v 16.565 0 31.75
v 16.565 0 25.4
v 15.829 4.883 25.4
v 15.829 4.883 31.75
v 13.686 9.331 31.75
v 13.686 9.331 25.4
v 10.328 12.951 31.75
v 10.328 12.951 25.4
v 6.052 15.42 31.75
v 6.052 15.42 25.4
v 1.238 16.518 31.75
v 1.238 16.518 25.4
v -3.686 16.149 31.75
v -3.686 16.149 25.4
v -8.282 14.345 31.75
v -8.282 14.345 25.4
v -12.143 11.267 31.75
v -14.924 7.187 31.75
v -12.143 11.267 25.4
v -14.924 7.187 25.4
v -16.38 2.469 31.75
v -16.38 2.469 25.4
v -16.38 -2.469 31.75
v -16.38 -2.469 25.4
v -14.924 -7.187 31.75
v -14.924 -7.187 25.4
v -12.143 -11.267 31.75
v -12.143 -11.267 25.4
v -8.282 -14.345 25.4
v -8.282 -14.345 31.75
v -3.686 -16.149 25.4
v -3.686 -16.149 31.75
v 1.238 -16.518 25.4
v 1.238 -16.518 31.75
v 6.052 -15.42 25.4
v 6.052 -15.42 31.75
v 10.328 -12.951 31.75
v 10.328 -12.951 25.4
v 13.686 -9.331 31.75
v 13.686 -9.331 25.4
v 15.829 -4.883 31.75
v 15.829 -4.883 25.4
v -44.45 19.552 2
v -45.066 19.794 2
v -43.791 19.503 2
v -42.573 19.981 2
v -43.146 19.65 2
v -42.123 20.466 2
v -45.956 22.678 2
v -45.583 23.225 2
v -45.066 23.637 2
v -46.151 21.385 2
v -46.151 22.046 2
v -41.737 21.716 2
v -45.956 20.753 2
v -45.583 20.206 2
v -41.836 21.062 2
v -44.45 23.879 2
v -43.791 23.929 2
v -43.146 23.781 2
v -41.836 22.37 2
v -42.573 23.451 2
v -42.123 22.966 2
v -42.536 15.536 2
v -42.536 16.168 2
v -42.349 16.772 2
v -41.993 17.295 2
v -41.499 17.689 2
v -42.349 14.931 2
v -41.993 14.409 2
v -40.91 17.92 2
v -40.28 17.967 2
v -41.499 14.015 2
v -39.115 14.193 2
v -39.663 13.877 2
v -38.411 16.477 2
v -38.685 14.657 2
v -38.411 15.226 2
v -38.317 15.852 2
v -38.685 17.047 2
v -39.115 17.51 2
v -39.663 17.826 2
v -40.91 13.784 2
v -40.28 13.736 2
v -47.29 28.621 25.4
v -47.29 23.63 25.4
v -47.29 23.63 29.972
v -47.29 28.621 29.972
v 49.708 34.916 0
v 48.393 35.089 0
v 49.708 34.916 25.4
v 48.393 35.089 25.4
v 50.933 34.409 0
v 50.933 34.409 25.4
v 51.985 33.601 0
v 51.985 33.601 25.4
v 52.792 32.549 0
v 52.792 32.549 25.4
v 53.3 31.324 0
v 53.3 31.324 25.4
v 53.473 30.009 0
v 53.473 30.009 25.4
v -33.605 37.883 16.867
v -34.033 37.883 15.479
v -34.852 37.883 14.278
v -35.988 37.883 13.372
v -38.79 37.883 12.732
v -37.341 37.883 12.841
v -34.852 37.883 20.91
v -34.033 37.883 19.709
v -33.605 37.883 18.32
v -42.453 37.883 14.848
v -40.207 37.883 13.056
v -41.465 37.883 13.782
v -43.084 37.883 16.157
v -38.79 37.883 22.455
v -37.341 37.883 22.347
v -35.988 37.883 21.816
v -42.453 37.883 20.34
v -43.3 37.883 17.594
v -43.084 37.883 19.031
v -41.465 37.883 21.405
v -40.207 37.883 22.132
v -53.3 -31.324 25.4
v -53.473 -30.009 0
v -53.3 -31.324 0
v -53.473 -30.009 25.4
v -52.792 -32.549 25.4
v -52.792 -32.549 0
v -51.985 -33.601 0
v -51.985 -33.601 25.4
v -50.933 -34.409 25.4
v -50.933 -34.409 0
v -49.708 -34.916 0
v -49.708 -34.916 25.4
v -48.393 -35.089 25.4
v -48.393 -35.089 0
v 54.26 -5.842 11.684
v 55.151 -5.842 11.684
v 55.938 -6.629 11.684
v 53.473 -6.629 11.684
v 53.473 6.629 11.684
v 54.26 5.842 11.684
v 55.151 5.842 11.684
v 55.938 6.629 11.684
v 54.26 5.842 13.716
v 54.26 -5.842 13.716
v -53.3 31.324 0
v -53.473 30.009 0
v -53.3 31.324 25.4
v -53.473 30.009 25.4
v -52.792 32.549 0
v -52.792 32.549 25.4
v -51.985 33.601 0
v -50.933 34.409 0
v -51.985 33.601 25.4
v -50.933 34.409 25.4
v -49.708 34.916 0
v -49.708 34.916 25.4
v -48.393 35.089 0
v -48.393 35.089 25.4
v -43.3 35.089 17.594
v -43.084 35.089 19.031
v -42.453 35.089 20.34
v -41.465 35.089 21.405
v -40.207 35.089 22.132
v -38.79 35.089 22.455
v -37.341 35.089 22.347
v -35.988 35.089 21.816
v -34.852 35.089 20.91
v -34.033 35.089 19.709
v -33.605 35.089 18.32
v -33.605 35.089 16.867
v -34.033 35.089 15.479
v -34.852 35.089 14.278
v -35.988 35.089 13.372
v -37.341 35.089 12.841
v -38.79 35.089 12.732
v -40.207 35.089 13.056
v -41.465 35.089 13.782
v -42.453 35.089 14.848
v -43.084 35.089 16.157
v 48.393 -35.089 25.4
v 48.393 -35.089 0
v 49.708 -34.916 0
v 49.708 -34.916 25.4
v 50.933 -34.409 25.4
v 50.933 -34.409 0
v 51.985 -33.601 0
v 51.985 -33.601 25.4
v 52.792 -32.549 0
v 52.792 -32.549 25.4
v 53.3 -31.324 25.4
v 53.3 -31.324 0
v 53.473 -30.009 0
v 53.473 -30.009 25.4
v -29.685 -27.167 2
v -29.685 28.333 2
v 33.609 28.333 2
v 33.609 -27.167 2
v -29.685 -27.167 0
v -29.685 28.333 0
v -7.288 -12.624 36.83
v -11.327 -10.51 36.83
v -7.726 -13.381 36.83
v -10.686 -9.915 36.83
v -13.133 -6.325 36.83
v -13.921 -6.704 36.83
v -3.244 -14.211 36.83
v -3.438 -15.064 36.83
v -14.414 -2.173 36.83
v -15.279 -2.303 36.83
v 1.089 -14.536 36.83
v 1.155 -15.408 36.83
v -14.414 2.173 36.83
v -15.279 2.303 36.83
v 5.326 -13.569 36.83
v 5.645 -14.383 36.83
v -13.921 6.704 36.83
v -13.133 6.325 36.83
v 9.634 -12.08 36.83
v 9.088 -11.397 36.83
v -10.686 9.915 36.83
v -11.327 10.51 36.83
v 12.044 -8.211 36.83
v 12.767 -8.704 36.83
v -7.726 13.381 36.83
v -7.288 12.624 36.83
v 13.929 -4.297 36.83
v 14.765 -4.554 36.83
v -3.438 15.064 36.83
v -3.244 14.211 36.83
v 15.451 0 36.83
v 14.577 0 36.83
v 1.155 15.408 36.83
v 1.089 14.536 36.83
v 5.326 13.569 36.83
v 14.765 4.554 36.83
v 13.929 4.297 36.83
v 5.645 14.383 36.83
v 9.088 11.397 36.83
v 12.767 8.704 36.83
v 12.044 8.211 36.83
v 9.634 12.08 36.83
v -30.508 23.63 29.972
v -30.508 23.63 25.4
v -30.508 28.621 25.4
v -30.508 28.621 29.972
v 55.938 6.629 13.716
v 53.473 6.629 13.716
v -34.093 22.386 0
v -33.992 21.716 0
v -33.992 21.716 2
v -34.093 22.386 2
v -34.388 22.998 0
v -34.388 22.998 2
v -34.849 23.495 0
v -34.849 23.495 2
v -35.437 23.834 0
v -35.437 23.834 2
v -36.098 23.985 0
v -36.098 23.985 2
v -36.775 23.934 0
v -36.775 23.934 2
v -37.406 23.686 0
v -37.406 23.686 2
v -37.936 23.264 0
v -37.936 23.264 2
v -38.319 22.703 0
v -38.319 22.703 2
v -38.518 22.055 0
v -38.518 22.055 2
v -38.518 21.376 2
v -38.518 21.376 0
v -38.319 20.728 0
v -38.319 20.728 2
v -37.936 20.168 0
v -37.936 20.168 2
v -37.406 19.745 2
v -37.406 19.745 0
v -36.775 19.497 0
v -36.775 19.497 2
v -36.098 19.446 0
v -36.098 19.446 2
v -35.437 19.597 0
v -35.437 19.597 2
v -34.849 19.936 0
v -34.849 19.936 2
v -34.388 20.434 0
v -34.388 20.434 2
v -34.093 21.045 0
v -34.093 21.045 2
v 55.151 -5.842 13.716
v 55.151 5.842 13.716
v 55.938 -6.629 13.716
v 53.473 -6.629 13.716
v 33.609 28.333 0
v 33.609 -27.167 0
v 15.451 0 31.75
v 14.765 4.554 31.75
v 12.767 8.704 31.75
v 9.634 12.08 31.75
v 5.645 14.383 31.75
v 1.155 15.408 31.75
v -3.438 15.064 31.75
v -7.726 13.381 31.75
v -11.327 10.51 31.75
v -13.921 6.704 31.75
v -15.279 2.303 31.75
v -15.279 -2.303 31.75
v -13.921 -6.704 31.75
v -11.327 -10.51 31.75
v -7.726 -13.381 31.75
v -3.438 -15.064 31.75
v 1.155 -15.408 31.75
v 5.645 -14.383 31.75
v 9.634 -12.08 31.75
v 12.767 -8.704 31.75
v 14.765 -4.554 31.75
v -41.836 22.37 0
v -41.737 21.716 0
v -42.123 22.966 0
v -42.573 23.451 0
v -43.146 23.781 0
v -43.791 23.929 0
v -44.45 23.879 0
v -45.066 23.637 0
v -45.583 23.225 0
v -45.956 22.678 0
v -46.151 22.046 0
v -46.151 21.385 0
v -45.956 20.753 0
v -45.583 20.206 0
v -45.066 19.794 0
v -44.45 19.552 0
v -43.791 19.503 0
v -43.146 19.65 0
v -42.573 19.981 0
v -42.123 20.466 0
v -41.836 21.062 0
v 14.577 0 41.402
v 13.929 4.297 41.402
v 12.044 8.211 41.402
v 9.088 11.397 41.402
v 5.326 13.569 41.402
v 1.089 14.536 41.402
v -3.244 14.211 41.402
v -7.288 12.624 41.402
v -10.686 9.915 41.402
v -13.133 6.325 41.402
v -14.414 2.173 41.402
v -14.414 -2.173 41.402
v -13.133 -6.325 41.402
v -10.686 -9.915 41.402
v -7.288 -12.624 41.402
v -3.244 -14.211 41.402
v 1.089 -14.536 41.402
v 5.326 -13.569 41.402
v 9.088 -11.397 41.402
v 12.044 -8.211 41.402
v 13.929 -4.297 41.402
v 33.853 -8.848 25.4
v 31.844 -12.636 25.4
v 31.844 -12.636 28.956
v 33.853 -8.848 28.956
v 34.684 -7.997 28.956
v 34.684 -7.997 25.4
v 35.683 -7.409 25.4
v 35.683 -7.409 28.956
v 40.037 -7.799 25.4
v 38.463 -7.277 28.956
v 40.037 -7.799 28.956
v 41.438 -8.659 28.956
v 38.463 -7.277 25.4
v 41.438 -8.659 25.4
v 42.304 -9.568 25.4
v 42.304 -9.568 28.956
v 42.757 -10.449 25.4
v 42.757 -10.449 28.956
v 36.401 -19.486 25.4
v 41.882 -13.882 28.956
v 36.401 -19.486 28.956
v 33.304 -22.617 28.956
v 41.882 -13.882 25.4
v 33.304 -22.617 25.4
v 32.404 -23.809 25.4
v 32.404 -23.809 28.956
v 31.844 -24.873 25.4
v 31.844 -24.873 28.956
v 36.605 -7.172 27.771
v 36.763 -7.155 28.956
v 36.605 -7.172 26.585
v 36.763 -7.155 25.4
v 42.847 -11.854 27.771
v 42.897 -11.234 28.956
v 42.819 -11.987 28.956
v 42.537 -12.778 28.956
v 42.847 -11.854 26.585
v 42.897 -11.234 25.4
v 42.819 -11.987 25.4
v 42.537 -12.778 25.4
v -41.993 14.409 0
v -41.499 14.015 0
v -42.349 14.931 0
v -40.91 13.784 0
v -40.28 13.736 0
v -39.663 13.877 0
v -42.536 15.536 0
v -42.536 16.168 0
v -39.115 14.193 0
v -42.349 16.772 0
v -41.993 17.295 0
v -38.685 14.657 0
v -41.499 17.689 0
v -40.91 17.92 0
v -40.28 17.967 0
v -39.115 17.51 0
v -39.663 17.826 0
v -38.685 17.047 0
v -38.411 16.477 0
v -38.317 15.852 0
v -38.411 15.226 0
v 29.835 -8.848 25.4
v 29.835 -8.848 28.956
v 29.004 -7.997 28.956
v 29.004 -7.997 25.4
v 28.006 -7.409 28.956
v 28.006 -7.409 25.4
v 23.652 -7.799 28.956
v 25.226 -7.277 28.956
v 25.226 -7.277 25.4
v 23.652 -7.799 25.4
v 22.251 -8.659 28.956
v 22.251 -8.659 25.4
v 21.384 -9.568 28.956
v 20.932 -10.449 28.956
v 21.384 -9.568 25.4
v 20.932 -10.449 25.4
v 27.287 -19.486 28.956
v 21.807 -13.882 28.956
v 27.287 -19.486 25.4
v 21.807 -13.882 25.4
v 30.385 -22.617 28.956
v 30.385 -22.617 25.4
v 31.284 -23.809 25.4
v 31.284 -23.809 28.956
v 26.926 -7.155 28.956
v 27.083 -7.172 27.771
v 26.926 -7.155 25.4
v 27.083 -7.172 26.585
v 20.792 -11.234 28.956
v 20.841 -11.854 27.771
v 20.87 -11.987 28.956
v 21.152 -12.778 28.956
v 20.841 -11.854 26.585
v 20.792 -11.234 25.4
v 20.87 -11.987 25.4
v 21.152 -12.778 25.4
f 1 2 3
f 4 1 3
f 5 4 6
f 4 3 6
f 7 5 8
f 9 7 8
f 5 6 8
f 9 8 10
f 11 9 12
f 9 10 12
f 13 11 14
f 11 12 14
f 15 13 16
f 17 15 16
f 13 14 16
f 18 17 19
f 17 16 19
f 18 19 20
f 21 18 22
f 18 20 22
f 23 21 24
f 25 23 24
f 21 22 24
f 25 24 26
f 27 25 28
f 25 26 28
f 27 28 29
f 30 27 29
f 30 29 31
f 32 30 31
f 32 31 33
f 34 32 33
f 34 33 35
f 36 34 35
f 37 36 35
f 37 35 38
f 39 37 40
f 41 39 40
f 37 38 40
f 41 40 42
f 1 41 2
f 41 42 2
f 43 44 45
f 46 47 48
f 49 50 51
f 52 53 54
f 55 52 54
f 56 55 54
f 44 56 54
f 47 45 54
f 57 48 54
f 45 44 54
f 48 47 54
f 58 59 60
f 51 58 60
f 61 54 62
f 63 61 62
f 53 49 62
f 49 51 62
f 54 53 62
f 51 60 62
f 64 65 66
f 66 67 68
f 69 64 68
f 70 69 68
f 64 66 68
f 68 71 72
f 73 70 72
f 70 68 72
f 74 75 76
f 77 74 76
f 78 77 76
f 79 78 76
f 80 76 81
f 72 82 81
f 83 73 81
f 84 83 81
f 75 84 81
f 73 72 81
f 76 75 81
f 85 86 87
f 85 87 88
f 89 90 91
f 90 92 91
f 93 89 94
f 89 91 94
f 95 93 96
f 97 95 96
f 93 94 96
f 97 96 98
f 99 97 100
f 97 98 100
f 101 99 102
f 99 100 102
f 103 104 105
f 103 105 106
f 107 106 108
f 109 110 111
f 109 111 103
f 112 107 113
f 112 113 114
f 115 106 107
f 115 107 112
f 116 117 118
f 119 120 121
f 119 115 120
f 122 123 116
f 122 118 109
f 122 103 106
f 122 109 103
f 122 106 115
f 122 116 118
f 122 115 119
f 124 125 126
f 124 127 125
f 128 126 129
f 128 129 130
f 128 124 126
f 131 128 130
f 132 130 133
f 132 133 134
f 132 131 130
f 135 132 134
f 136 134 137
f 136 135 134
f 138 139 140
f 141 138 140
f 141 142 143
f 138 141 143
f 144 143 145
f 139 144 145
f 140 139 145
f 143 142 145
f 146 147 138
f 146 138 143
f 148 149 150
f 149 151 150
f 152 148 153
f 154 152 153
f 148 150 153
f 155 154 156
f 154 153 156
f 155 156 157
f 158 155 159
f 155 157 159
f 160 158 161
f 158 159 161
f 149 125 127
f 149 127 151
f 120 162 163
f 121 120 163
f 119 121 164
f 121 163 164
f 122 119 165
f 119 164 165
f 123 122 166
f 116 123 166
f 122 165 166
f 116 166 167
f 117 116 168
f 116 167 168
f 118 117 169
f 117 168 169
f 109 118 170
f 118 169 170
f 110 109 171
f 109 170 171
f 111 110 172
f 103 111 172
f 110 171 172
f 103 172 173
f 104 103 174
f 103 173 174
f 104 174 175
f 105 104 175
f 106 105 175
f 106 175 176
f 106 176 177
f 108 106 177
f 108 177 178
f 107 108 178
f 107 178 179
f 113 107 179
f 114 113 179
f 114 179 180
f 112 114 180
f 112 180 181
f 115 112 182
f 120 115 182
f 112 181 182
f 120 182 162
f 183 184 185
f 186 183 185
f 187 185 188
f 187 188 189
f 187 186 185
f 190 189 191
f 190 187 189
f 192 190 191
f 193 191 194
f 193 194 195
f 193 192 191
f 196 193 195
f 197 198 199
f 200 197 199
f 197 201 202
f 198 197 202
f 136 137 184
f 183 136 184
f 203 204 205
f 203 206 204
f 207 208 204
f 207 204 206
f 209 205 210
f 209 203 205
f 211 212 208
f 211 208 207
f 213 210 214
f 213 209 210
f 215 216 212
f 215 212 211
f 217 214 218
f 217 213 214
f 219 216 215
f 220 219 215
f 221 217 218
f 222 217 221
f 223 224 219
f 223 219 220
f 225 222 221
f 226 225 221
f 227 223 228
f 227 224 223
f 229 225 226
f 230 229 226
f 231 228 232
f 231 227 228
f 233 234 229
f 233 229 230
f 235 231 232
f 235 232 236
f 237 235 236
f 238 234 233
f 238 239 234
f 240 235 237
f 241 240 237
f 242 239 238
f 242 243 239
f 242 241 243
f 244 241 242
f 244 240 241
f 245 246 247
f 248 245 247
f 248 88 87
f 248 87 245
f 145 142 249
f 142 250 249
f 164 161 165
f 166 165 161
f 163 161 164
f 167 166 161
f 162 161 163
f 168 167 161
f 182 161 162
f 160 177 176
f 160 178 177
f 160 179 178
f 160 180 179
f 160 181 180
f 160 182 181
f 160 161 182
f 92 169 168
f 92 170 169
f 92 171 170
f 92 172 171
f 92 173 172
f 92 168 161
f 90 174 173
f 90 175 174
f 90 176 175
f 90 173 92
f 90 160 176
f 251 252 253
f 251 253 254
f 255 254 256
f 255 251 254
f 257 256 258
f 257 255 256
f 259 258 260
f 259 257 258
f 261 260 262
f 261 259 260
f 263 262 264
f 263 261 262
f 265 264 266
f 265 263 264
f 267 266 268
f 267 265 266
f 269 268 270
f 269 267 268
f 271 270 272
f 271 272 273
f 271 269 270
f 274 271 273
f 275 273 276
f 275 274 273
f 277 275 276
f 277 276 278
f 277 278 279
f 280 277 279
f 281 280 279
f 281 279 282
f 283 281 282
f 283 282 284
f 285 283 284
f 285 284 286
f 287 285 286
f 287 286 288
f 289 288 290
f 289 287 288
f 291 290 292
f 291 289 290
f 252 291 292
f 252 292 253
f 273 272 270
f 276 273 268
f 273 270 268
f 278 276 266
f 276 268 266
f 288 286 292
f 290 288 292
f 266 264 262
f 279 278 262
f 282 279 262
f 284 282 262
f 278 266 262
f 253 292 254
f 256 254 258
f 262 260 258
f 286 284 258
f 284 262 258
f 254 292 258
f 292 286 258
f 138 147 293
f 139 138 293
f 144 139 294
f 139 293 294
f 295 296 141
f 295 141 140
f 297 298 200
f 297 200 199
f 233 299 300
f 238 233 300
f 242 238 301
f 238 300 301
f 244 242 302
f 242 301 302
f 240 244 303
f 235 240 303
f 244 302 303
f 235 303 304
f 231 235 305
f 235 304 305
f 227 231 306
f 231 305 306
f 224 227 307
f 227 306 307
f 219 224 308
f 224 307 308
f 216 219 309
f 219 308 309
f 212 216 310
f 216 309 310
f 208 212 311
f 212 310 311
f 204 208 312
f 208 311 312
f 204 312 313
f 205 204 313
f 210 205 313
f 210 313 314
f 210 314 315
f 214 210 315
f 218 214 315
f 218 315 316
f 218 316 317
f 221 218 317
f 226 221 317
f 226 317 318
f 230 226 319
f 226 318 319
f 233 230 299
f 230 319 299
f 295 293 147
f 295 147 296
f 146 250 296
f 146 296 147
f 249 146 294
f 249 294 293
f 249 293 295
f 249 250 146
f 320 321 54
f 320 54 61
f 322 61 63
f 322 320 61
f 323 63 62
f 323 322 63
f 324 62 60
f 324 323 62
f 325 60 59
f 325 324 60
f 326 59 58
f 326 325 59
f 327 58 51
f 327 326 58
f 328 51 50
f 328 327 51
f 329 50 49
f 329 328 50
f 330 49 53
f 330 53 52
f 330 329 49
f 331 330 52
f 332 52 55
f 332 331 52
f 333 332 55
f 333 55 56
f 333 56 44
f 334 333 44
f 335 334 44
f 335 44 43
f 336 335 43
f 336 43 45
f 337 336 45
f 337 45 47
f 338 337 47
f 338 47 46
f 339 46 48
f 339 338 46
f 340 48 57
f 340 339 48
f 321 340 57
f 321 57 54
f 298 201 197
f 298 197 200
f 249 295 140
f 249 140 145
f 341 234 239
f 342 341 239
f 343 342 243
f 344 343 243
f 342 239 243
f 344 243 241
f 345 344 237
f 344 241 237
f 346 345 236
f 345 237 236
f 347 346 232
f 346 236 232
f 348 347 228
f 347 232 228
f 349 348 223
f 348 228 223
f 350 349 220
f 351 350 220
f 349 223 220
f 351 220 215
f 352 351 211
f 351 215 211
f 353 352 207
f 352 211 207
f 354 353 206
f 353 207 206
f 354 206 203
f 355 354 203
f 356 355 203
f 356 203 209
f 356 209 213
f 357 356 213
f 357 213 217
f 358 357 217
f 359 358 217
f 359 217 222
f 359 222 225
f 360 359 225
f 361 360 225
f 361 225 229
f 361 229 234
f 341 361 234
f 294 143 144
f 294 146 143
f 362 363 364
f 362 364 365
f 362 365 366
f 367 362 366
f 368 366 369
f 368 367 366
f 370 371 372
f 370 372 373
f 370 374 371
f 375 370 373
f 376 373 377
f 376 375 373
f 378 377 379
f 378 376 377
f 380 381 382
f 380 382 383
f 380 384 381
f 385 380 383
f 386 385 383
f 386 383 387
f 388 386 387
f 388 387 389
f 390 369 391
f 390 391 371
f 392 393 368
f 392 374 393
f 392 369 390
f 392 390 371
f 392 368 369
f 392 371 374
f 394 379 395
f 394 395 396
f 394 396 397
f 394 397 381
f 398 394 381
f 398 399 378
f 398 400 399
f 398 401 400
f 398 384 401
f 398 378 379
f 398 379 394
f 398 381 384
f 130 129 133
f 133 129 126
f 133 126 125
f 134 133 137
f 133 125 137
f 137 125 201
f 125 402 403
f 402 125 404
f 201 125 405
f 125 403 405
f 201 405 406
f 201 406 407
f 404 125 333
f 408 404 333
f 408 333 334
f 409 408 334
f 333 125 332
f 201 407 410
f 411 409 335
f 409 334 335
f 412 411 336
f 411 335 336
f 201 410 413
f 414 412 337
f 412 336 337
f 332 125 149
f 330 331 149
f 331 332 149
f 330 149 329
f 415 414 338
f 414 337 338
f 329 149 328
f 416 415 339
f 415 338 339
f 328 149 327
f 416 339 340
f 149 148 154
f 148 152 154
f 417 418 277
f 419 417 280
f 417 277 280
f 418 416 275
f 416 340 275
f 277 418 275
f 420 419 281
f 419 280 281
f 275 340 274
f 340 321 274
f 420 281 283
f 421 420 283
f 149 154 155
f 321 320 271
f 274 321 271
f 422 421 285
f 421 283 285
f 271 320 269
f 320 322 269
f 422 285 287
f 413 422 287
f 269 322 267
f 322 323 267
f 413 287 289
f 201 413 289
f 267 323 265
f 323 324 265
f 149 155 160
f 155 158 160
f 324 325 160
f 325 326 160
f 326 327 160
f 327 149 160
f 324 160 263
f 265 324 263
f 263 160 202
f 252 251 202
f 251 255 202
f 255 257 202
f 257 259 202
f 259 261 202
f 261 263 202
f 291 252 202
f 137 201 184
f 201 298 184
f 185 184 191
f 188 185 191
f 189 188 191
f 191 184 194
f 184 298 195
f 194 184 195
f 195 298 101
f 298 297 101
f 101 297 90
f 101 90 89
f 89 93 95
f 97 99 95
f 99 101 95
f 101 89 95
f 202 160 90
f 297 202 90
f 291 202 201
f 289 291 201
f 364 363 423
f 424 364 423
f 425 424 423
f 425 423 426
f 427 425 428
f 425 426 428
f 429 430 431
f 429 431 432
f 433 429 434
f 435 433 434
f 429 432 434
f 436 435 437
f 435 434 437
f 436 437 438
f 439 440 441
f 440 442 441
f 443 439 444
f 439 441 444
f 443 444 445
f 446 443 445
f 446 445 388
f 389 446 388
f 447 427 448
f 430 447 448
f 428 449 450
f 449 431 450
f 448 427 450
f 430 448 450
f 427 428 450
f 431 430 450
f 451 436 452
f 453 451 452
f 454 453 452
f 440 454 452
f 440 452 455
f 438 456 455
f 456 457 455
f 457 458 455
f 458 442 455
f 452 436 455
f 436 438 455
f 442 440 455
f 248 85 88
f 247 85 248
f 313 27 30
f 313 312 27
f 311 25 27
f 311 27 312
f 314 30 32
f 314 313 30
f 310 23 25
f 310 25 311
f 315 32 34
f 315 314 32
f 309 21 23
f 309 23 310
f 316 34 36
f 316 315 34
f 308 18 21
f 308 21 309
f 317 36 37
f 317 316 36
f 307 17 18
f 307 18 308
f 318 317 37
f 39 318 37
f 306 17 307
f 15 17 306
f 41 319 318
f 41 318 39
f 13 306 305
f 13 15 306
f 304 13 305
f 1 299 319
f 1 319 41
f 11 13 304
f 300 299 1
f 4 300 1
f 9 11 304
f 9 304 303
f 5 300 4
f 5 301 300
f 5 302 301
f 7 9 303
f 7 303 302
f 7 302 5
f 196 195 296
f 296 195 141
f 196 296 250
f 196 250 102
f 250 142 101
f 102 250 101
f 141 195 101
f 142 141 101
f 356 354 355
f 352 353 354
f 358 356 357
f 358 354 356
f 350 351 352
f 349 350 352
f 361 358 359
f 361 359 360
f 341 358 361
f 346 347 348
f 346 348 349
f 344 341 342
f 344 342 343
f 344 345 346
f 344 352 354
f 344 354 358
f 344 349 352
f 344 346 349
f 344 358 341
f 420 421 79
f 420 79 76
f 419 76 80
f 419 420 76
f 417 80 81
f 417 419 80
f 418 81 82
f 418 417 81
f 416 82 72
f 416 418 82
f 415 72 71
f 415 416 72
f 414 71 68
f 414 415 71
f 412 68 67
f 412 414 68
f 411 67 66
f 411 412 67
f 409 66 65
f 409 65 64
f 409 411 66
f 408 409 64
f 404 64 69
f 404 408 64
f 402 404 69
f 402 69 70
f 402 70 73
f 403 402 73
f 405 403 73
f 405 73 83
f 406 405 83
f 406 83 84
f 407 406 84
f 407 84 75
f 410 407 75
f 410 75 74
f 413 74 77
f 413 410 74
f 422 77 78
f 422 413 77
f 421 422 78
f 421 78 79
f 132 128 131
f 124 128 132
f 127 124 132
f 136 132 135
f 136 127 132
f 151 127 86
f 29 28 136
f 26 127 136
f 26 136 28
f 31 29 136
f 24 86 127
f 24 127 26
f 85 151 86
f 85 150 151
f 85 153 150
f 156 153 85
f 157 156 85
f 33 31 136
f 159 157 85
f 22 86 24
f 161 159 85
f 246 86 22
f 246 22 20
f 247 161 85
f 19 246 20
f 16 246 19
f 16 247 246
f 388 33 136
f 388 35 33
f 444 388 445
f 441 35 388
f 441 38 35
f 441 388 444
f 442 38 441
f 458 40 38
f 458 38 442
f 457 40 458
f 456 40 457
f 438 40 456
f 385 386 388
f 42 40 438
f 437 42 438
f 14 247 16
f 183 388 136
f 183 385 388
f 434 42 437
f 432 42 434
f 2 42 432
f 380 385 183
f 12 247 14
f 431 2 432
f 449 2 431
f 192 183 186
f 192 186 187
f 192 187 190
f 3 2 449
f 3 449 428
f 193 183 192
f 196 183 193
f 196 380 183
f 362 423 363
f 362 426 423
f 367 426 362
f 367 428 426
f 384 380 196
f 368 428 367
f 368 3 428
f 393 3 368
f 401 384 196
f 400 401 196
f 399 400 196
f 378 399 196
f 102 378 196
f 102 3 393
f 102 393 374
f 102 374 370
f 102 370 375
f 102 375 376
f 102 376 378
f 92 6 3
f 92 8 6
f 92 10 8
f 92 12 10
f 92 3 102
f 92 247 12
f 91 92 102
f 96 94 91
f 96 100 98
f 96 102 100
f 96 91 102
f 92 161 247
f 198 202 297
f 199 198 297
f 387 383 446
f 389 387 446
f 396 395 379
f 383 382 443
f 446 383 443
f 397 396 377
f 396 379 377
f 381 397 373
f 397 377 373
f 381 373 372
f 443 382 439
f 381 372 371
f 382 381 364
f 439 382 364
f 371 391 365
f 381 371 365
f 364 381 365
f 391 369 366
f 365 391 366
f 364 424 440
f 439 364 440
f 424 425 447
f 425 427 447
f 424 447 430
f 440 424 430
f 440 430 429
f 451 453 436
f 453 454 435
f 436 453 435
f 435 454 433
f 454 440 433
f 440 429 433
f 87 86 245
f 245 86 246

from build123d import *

# Parameters (mm, degrees)
F0_W      = 106.945887208
F0_H      = 70.1787695289
F1_DEPTH  = 25.4
F2_R      = 16.5647442007
F3_DEPTH  = 6.35
F4_R      = 15.4514430259
F4_R_2    = 14.5768166451
F5_DEPTH  = 5.08
F6_W      = 16.7820453644
F6_H      = 4.9917921424
F7_DEPTH  = 4.572
F9_DEPTH  = 3.556
F10_R     = 4.8749560022
F11_DEPTH = 2.794
F12_R     = 5.08
F15_W     = 2.4653045057
F15_H     = 13.2586471736
F15_W_2   = 0.8905041559
F15_H_2   = 11.6838468239
F16_DEPTH = 1.016
F17_W     = 63.2937094197
F17_H     = 55.5002773181
F17_R     = 2.1212827151
F17_R_2   = 2.2190878442
F17_R_3   = 2.2757544949
F18_DEPTH = 2
F19_DEPTH = 9.652


with BuildPart() as f1:
    # F0 (on Top) → F1 (new body)
    with BuildSketch(Plane.XY):
        Rectangle(F0_W, F0_H)
    extrude(amount=F1_DEPTH)

    # F2 (on face) → F3 (join)
    with BuildSketch(Plane.XY.offset(25.4)):
        Circle(F2_R)
    extrude(amount=F3_DEPTH)

    # F4 (on face) → F5 (join)
    with BuildSketch(Plane.XY.offset(31.75)):
        Circle(F4_R)
        Circle(F4_R_2, mode=Mode.SUBTRACT)
    extrude(amount=F5_DEPTH)

    # F6 (on face) → F7 (join)
    with BuildSketch(Plane.XY.offset(25.4)):
        with Locations((-38.8989336789, 26.1253975332)):
            Rectangle(F6_W, F6_H)
    extrude(amount=F7_DEPTH)

    # F8 (on face) → F9 (join)
    with BuildSketch(Plane.XY.offset(25.4)):
        with BuildLine():
            add(Edge.make_bspline(
                [(31.8442881107, -12.6362098381), (32.9562300538, -10.0665577137), (35.221941382, -4.8305919654), (48.841003928, -11.6298962751), (33.3513436417, -20.9799528384), (31.8442881107, -24.8728917222)],
                knots=[0, 0, 0, 0, 0.1573778113, 0.3206756361, 0.533694036, 0.533694036, 0.533694036, 0.533694036], degree=3))
            add(Edge.make_bspline(
                [(31.8442881107, -12.6362098381), (30.7323461677, -10.0665577137), (28.4666348395, -4.8305919654), (14.8475722934, -11.6298962751), (30.3372325798, -20.9799528384), (31.8442881107, -24.8728917222)],
                knots=[0, 0, 0, 0, 0.1573778113, 0.3206756361, 0.533694036, 0.533694036, 0.533694036, 0.533694036], degree=3))
        make_face()
    extrude(amount=F9_DEPTH)

    # F10 (on face) → F11 (join)
    with BuildSketch(Plane(origin=(0, 35.0893847644, 0), x_dir=(-1, 0, 0), z_dir=(0, 1, 0))):
        with Locations((38.4255424142, 17.5938177854)):
            Circle(F10_R)
    extrude(amount=F11_DEPTH)

    # F12
    f12_edges = [f1.edges().sort_by_distance(p)[0] for p in [
        (53.472944, 35.089385, 12.7),
        (53.472944, -35.089385, 12.7),
        (-53.472944, 35.089385, 12.7),
        (-53.472944, -35.089385, 12.7),
    ]]
    fillet(f12_edges, radius=F12_R)

    # F15 (on plane+point) → F16 (join, symmetric)
    with BuildSketch(Plane.XY.offset(12.7)):
        with Locations((54.7055958568, 0)):
            Rectangle(F15_W, F15_H)
        with Locations((54.7055958568, 0)):
            Rectangle(F15_W_2, F15_H_2, mode=Mode.SUBTRACT)
    extrude(amount=F16_DEPTH, both=True)

    # F17 (on Top) → F18 (cut)
    with BuildSketch(Plane.XY):
        with Locations((1.9618016668, 0.582842622)):
            Rectangle(F17_W, F17_H)
        with Locations((-40.4380485415, 15.8517025411)):
            Circle(F17_R)
        with Locations((-43.9564026892, 21.7156279832)):
            Circle(F17_R_2)
        with Locations((-36.268144846, 21.7156279832)):
            Circle(F17_R_3)
    extrude(amount=F18_DEPTH, mode=Mode.SUBTRACT)

    # F19 (add): a face of the model
    f19_faces = [f1.faces().sort_by_distance(p)[0] for p in [
        (0, 0, 31.75),
    ]]
    extrude(f19_faces, amount=F19_DEPTH)


solid = f1.part
